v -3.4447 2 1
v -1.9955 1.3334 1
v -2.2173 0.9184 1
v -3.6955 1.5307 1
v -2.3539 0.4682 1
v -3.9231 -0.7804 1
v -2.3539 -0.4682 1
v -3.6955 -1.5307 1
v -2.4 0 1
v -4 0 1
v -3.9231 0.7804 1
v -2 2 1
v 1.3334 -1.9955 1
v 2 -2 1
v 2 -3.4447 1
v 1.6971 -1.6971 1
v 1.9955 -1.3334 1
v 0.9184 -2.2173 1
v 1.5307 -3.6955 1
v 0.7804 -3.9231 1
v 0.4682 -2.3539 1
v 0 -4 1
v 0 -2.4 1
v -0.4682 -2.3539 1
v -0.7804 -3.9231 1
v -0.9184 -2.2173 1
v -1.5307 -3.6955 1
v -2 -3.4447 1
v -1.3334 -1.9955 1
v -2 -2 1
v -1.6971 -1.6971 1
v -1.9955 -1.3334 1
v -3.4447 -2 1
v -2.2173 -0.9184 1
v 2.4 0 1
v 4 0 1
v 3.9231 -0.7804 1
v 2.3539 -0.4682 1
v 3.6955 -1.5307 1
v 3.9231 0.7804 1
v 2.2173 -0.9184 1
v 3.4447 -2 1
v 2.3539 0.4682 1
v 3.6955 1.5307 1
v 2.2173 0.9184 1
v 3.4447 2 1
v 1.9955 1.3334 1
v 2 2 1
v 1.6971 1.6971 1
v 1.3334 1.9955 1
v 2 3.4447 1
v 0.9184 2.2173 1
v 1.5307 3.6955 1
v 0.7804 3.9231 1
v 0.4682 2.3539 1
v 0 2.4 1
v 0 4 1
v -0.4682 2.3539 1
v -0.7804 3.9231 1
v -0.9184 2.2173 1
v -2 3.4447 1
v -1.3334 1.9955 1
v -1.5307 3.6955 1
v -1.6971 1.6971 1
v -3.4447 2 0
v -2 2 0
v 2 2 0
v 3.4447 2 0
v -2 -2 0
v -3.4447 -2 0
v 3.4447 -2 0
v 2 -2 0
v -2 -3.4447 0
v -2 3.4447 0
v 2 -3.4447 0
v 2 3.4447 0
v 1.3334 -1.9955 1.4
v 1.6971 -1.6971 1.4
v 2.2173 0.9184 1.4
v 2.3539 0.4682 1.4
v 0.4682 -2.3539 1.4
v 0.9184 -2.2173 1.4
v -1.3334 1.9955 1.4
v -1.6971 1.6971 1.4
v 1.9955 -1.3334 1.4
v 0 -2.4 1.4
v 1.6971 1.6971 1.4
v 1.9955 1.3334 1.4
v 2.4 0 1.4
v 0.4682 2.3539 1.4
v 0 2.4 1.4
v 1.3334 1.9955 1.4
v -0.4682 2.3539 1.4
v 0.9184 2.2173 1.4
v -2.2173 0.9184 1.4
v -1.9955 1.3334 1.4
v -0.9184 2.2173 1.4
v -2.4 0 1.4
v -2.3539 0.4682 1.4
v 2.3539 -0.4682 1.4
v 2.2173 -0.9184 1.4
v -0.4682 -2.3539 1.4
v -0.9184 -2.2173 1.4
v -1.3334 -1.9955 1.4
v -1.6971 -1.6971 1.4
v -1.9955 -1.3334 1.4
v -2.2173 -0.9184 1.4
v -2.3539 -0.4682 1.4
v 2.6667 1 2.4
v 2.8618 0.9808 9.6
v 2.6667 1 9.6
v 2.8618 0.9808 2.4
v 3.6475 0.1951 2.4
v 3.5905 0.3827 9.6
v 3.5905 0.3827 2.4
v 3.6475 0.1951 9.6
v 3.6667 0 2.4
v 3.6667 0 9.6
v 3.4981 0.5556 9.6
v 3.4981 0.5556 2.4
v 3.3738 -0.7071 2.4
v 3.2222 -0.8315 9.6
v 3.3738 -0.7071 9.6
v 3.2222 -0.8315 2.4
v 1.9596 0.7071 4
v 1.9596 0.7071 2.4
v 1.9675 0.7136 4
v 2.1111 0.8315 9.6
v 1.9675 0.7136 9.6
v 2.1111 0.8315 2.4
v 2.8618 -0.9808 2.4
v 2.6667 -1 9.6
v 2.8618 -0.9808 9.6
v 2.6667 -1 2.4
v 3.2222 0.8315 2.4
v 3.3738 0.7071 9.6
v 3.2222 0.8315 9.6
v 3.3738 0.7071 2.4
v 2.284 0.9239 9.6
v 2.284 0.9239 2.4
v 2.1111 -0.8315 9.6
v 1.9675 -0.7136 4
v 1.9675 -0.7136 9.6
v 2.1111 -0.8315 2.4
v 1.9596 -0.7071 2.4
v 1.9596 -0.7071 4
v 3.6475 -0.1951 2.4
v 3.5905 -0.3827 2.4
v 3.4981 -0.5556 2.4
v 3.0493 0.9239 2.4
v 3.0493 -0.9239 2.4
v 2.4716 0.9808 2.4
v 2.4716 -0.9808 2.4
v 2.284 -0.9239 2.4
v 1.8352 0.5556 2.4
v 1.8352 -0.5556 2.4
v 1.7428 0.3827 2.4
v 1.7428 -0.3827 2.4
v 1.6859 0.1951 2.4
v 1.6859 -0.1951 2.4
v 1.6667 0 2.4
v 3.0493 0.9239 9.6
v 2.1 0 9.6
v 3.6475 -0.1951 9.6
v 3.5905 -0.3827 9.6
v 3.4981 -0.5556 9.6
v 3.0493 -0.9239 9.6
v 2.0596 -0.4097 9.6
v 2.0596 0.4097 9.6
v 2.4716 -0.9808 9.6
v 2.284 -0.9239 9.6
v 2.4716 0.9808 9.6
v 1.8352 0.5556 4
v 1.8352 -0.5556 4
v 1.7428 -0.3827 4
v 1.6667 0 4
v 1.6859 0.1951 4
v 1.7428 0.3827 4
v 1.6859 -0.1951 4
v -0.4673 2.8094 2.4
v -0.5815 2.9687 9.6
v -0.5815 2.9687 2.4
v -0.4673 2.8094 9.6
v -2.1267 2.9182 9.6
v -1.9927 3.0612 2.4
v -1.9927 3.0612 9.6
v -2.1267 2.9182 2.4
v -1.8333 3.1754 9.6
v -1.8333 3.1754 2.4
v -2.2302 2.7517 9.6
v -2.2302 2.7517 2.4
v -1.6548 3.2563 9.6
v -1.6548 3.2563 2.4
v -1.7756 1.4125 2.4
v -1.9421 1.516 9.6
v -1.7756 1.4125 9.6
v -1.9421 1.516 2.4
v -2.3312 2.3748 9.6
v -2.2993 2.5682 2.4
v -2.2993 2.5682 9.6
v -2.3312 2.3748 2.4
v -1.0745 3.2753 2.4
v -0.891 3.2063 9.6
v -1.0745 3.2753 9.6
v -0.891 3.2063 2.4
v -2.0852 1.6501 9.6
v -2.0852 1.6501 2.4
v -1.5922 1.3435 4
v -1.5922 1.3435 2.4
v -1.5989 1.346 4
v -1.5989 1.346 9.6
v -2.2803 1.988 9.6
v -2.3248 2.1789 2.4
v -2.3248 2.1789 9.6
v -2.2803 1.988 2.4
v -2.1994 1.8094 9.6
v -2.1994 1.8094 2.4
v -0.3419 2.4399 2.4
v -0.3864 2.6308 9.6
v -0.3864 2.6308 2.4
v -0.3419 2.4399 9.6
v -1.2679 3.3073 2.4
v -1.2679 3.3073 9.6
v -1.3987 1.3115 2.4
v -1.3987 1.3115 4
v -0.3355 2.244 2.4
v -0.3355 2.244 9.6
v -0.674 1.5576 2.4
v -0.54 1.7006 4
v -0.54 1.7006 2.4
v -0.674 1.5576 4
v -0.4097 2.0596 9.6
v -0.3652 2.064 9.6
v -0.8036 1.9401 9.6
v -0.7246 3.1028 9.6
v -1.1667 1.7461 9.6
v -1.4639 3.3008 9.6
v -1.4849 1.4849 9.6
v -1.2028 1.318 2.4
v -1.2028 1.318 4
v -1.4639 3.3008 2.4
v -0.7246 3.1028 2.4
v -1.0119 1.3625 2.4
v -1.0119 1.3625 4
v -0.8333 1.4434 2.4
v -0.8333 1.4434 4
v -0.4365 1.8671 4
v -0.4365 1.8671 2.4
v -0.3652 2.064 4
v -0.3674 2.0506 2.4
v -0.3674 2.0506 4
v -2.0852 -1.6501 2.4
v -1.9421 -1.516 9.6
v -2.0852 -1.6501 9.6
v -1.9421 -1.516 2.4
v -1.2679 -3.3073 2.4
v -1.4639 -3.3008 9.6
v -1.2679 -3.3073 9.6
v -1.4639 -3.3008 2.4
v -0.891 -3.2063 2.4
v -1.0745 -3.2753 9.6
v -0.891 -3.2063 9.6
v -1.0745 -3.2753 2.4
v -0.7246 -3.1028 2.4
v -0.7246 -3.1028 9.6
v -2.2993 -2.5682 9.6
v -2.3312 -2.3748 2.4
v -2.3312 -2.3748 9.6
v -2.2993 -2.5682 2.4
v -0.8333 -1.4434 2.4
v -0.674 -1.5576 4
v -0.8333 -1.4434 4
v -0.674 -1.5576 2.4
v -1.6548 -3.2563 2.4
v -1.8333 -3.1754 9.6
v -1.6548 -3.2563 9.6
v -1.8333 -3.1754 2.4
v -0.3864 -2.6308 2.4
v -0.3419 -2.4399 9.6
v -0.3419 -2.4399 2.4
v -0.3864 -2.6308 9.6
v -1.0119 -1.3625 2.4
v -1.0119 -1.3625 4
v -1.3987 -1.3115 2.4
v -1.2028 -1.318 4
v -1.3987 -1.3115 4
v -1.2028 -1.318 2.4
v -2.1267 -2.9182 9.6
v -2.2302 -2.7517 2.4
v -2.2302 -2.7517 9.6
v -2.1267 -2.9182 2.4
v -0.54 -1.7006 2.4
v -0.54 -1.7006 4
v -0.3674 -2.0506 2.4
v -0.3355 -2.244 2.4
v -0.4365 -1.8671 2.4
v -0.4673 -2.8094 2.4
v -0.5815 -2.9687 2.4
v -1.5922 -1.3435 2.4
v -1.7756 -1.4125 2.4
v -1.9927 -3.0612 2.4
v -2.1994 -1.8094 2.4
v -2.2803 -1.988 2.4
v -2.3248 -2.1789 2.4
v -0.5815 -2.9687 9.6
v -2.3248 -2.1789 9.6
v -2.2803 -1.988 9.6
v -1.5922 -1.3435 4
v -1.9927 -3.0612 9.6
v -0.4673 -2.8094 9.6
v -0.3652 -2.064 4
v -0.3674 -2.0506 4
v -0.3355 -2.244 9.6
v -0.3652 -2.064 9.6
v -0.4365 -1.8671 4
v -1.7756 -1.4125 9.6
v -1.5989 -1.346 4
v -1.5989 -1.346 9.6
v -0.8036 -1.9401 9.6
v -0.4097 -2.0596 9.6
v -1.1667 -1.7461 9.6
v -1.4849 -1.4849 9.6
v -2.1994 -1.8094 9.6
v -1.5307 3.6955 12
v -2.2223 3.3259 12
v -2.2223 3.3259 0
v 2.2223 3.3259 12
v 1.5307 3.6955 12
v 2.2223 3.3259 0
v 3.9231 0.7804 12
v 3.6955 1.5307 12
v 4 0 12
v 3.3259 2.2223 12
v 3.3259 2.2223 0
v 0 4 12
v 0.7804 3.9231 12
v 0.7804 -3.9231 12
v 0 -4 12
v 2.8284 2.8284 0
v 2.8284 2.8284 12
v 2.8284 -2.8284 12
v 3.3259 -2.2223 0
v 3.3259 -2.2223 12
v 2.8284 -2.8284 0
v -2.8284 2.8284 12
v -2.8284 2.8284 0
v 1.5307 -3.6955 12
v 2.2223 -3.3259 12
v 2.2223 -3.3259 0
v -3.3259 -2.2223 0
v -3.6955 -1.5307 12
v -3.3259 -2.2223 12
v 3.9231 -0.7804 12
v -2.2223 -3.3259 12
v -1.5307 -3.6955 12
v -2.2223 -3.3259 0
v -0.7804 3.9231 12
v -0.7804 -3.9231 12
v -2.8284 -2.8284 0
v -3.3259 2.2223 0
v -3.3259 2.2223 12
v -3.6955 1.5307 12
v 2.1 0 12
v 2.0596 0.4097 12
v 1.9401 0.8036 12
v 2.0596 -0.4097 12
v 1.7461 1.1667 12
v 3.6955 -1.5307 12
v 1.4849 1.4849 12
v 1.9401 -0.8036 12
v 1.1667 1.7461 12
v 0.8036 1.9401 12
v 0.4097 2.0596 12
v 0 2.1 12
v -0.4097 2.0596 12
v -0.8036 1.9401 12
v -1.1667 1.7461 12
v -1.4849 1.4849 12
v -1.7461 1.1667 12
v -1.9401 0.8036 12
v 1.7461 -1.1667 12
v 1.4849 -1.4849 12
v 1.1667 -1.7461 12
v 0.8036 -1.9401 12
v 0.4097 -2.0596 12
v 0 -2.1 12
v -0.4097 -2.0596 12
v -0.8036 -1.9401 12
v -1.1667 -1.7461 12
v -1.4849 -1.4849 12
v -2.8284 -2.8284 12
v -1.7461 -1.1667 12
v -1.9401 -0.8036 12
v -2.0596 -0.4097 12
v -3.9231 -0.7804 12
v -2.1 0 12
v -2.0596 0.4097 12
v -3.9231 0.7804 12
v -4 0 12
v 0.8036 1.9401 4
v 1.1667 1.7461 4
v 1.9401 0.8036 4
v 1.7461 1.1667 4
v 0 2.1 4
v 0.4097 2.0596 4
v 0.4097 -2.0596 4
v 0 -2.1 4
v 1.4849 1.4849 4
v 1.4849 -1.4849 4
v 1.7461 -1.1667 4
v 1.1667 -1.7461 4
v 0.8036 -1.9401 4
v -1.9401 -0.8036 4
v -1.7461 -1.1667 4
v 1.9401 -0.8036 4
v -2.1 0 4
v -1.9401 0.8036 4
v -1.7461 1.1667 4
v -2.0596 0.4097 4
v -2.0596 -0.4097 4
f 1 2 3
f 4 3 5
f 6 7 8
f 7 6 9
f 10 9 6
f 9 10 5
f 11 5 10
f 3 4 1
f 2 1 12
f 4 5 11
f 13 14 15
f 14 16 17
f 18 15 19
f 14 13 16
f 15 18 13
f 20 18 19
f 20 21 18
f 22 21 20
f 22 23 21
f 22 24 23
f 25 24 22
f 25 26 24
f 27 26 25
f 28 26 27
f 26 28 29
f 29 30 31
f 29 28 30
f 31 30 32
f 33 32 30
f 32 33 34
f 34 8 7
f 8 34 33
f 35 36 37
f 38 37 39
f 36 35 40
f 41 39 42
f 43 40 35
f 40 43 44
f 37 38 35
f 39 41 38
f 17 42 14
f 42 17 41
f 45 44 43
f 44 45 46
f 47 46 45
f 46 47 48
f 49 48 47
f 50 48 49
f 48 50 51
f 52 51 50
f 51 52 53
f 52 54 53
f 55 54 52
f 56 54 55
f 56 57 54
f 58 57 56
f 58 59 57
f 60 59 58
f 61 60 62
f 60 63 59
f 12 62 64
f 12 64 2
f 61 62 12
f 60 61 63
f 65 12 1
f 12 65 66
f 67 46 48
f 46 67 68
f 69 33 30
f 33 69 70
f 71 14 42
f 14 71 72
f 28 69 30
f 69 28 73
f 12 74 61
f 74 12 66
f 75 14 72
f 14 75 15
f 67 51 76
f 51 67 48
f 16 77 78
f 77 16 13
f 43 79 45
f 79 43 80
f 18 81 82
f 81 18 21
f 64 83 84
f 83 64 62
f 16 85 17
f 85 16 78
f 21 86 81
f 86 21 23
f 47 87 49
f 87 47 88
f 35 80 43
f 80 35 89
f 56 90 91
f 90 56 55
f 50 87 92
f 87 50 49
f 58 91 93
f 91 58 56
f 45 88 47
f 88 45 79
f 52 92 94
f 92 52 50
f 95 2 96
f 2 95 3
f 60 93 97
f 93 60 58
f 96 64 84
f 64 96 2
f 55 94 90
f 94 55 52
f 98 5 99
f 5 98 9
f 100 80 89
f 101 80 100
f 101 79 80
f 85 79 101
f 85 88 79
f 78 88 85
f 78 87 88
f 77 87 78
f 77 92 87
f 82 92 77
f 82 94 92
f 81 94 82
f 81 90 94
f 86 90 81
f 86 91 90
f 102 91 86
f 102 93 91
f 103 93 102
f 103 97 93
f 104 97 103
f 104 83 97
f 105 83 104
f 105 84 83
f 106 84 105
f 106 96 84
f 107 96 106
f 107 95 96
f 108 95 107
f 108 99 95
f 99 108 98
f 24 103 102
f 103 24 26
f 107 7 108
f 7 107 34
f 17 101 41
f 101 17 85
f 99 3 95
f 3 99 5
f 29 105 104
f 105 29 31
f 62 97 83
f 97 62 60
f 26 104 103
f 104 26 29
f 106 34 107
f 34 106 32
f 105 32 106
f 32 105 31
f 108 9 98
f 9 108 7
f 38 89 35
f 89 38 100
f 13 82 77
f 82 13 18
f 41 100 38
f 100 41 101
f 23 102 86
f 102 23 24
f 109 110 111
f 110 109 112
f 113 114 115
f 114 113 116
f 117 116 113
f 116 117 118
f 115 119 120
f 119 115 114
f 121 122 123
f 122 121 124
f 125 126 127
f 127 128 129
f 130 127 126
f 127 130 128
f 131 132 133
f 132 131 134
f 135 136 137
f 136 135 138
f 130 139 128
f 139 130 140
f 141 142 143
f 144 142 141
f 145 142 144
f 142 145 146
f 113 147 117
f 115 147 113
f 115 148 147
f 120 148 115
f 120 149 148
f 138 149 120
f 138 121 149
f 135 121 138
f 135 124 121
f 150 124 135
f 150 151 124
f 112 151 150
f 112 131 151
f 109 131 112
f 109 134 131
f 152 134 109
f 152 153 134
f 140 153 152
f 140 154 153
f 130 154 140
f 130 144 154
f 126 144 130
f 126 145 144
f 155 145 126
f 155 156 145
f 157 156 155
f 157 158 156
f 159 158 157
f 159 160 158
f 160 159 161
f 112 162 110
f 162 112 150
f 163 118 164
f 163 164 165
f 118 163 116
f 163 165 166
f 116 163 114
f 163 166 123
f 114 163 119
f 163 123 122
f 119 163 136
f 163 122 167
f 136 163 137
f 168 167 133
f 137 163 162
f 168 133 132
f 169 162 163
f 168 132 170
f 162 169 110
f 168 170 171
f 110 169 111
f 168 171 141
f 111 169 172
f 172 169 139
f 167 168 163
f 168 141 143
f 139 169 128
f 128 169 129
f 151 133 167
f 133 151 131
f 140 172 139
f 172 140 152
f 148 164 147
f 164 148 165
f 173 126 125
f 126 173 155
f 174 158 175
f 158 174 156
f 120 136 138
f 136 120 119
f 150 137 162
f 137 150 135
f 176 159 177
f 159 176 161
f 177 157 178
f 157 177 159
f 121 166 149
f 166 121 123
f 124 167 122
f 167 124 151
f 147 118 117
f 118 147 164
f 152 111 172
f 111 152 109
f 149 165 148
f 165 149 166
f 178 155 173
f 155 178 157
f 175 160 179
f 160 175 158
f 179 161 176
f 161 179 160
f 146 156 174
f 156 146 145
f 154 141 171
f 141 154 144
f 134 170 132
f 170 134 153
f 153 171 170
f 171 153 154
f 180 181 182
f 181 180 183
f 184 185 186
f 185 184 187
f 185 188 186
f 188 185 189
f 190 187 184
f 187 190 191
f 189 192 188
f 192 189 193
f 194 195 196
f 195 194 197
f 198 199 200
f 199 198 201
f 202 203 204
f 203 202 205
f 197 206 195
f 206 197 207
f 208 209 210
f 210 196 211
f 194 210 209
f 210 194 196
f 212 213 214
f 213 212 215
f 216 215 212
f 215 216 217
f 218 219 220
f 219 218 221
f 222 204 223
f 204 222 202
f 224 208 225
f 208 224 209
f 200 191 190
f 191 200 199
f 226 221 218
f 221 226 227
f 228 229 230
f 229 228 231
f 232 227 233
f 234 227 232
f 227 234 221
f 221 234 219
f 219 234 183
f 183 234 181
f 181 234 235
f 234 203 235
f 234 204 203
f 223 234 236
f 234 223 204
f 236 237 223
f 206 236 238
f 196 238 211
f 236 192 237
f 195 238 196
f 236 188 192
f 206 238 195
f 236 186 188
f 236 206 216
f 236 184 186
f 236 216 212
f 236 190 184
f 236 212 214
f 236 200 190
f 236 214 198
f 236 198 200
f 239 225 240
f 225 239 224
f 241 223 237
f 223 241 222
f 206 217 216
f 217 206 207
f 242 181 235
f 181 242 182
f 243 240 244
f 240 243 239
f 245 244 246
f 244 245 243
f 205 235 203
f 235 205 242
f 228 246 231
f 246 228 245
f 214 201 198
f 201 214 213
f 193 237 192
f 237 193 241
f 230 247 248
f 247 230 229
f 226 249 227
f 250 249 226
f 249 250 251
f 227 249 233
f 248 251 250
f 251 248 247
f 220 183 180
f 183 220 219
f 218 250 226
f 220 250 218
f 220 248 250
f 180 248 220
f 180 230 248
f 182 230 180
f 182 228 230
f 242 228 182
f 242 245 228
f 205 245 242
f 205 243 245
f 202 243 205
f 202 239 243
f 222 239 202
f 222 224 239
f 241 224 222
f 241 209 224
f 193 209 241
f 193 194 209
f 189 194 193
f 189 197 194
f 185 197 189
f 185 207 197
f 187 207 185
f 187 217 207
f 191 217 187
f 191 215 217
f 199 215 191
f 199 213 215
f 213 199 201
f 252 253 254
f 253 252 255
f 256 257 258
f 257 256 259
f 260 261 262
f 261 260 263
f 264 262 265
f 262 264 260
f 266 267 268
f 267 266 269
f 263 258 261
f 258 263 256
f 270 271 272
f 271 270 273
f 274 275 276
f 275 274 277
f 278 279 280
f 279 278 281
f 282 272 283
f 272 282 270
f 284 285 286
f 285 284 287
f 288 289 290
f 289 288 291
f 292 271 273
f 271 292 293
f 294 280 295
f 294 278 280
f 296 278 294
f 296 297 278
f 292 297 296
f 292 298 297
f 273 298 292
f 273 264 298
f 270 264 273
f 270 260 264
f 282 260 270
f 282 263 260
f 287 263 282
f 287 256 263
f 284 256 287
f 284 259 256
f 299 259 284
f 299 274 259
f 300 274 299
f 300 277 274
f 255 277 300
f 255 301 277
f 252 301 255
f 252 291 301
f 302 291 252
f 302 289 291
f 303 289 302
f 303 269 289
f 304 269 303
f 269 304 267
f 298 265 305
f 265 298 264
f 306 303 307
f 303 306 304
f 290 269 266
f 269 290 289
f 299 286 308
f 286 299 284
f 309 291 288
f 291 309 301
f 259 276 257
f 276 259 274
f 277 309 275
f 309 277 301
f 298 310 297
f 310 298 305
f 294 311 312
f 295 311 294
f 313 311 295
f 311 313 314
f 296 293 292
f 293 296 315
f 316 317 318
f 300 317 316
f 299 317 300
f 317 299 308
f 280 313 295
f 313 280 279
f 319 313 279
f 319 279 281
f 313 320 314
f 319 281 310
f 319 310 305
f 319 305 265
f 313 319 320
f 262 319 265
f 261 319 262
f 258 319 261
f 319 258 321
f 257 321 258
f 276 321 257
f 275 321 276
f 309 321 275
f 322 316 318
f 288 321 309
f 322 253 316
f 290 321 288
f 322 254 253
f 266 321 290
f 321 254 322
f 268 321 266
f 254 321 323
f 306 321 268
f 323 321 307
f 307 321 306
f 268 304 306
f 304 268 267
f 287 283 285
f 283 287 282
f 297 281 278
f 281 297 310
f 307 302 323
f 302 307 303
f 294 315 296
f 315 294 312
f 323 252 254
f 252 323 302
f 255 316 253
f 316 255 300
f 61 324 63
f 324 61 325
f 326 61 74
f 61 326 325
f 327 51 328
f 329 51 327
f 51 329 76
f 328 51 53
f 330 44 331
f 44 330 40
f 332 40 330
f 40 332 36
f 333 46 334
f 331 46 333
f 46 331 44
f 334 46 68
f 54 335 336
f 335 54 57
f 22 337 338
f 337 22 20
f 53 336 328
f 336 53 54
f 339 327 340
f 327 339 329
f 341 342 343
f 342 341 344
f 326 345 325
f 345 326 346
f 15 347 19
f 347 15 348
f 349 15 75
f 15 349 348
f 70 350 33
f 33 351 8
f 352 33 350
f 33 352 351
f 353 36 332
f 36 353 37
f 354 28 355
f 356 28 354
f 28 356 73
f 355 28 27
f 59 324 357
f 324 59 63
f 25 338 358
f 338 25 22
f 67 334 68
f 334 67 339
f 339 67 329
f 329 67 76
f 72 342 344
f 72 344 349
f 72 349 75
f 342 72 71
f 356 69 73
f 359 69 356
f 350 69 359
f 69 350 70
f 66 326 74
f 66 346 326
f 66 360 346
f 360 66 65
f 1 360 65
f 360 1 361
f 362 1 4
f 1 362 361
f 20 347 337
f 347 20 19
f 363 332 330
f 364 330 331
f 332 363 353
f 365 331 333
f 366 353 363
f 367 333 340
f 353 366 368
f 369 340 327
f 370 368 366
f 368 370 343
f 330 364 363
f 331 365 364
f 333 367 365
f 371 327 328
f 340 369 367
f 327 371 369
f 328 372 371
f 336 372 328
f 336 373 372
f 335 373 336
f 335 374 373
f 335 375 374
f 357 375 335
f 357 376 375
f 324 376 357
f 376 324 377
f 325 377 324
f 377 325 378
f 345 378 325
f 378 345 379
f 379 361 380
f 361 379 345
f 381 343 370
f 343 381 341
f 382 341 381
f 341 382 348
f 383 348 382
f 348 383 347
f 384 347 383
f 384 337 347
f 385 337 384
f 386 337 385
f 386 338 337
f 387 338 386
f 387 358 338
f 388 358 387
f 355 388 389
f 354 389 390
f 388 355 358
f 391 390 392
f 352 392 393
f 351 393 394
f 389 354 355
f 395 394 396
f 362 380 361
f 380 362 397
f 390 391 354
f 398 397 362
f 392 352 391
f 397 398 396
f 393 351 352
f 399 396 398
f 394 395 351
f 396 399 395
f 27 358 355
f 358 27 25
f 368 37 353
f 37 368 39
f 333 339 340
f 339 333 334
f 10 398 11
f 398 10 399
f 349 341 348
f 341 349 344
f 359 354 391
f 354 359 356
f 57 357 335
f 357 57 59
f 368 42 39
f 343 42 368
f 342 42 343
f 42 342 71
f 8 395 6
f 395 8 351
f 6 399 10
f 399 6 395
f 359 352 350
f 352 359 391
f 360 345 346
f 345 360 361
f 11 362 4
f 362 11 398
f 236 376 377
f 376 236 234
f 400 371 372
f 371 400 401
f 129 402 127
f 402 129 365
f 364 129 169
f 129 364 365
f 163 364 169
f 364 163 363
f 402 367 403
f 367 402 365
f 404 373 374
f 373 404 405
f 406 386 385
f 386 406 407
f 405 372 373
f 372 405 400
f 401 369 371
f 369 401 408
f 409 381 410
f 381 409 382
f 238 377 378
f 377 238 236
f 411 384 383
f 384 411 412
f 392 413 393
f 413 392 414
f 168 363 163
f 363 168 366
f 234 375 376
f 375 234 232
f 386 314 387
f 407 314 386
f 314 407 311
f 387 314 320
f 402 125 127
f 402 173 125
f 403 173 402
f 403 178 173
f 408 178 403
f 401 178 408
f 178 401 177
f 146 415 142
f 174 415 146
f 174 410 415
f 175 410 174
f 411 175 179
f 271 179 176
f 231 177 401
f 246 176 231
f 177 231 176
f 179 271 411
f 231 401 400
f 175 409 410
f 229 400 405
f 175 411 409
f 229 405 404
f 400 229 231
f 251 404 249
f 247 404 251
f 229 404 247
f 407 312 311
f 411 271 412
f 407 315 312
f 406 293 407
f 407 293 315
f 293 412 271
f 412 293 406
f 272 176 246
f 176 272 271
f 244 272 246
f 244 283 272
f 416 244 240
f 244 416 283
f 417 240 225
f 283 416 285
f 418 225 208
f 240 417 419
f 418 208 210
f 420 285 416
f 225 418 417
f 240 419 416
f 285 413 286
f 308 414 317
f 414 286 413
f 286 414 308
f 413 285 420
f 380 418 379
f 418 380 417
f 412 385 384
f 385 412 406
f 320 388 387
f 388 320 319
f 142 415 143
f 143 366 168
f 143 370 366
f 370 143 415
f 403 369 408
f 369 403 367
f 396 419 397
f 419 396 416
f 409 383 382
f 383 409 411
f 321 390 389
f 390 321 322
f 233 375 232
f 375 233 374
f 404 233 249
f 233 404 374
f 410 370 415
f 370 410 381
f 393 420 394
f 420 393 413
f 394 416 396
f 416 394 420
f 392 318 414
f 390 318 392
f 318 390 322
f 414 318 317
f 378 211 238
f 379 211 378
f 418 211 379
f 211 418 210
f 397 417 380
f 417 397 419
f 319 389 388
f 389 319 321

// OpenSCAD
// AstraAnt Servo Horn to Leg Segment Adapter
// Connects the SG90 servo output horn to the ant's leg segment.
// Press-fit on both ends — servo horn star shape on one end,
// cylindrical socket for leg segment on the other.
//
// Print in PETG at 0.15mm layer height for best fit.
// May need +/- 0.1mm adjustment after test fit.

$fn = 32;

// SG90 servo horn dimensions (standard star/cross pattern)
horn_arm_length = 7;    // From center to tip of horn arm
horn_arm_width = 4;     // Width of each arm
horn_center_hole_d = 4.8; // Center bore (fits servo shaft spline)
horn_thickness = 2;

// Leg segment dimensions
leg_segment_od = 4;     // Outer diameter of leg tube
leg_socket_depth = 8;   // How deep the leg inserts
leg_socket_id = 4.2;    // Slightly oversized for press-fit (adjust!)

// Adapter body
adapter_length = 12;    // Total length from horn face to leg socket end
adapter_od = 8;         // Outer diameter of adapter body

module servo_horn_socket() {
    // Negative space matching the SG90 horn shape
    // Cross/star pattern with 4 arms
    for (a = [0, 90]) {
        rotate([0, 0, a])
            cube([horn_arm_length * 2, horn_arm_width, horn_thickness + 0.2], center=true);
    }
    // Center shaft hole
    cylinder(d=horn_center_hole_d, h=horn_thickness + 1, center=true);
}

module leg_socket() {
    // Socket for the leg segment tube
    cylinder(d=leg_socket_id, h=leg_socket_depth);
}

module adapter() {
    difference() {
        // Main body
        cylinder(d=adapter_od, h=adapter_length);

        // Servo horn socket (bottom end)
        translate([0, 0, -0.1])
            servo_horn_socket();

        // Leg segment socket (top end)
        translate([0, 0, adapter_length - leg_socket_depth])
            leg_socket();

        // Weight reduction holes
        for (a = [0, 120, 240]) {
            rotate([0, 0, a])
            translate([adapter_od/3, 0, adapter_length/2])
                cylinder(d=2, h=adapter_length * 0.6, center=true);
        }
    }
}

adapter();

// Print orientation: horn socket face on build plate
// No supports needed
// Test fit: if loose, reduce leg_socket_id by 0.1mm
//           if tight, increase by 0.1mm
